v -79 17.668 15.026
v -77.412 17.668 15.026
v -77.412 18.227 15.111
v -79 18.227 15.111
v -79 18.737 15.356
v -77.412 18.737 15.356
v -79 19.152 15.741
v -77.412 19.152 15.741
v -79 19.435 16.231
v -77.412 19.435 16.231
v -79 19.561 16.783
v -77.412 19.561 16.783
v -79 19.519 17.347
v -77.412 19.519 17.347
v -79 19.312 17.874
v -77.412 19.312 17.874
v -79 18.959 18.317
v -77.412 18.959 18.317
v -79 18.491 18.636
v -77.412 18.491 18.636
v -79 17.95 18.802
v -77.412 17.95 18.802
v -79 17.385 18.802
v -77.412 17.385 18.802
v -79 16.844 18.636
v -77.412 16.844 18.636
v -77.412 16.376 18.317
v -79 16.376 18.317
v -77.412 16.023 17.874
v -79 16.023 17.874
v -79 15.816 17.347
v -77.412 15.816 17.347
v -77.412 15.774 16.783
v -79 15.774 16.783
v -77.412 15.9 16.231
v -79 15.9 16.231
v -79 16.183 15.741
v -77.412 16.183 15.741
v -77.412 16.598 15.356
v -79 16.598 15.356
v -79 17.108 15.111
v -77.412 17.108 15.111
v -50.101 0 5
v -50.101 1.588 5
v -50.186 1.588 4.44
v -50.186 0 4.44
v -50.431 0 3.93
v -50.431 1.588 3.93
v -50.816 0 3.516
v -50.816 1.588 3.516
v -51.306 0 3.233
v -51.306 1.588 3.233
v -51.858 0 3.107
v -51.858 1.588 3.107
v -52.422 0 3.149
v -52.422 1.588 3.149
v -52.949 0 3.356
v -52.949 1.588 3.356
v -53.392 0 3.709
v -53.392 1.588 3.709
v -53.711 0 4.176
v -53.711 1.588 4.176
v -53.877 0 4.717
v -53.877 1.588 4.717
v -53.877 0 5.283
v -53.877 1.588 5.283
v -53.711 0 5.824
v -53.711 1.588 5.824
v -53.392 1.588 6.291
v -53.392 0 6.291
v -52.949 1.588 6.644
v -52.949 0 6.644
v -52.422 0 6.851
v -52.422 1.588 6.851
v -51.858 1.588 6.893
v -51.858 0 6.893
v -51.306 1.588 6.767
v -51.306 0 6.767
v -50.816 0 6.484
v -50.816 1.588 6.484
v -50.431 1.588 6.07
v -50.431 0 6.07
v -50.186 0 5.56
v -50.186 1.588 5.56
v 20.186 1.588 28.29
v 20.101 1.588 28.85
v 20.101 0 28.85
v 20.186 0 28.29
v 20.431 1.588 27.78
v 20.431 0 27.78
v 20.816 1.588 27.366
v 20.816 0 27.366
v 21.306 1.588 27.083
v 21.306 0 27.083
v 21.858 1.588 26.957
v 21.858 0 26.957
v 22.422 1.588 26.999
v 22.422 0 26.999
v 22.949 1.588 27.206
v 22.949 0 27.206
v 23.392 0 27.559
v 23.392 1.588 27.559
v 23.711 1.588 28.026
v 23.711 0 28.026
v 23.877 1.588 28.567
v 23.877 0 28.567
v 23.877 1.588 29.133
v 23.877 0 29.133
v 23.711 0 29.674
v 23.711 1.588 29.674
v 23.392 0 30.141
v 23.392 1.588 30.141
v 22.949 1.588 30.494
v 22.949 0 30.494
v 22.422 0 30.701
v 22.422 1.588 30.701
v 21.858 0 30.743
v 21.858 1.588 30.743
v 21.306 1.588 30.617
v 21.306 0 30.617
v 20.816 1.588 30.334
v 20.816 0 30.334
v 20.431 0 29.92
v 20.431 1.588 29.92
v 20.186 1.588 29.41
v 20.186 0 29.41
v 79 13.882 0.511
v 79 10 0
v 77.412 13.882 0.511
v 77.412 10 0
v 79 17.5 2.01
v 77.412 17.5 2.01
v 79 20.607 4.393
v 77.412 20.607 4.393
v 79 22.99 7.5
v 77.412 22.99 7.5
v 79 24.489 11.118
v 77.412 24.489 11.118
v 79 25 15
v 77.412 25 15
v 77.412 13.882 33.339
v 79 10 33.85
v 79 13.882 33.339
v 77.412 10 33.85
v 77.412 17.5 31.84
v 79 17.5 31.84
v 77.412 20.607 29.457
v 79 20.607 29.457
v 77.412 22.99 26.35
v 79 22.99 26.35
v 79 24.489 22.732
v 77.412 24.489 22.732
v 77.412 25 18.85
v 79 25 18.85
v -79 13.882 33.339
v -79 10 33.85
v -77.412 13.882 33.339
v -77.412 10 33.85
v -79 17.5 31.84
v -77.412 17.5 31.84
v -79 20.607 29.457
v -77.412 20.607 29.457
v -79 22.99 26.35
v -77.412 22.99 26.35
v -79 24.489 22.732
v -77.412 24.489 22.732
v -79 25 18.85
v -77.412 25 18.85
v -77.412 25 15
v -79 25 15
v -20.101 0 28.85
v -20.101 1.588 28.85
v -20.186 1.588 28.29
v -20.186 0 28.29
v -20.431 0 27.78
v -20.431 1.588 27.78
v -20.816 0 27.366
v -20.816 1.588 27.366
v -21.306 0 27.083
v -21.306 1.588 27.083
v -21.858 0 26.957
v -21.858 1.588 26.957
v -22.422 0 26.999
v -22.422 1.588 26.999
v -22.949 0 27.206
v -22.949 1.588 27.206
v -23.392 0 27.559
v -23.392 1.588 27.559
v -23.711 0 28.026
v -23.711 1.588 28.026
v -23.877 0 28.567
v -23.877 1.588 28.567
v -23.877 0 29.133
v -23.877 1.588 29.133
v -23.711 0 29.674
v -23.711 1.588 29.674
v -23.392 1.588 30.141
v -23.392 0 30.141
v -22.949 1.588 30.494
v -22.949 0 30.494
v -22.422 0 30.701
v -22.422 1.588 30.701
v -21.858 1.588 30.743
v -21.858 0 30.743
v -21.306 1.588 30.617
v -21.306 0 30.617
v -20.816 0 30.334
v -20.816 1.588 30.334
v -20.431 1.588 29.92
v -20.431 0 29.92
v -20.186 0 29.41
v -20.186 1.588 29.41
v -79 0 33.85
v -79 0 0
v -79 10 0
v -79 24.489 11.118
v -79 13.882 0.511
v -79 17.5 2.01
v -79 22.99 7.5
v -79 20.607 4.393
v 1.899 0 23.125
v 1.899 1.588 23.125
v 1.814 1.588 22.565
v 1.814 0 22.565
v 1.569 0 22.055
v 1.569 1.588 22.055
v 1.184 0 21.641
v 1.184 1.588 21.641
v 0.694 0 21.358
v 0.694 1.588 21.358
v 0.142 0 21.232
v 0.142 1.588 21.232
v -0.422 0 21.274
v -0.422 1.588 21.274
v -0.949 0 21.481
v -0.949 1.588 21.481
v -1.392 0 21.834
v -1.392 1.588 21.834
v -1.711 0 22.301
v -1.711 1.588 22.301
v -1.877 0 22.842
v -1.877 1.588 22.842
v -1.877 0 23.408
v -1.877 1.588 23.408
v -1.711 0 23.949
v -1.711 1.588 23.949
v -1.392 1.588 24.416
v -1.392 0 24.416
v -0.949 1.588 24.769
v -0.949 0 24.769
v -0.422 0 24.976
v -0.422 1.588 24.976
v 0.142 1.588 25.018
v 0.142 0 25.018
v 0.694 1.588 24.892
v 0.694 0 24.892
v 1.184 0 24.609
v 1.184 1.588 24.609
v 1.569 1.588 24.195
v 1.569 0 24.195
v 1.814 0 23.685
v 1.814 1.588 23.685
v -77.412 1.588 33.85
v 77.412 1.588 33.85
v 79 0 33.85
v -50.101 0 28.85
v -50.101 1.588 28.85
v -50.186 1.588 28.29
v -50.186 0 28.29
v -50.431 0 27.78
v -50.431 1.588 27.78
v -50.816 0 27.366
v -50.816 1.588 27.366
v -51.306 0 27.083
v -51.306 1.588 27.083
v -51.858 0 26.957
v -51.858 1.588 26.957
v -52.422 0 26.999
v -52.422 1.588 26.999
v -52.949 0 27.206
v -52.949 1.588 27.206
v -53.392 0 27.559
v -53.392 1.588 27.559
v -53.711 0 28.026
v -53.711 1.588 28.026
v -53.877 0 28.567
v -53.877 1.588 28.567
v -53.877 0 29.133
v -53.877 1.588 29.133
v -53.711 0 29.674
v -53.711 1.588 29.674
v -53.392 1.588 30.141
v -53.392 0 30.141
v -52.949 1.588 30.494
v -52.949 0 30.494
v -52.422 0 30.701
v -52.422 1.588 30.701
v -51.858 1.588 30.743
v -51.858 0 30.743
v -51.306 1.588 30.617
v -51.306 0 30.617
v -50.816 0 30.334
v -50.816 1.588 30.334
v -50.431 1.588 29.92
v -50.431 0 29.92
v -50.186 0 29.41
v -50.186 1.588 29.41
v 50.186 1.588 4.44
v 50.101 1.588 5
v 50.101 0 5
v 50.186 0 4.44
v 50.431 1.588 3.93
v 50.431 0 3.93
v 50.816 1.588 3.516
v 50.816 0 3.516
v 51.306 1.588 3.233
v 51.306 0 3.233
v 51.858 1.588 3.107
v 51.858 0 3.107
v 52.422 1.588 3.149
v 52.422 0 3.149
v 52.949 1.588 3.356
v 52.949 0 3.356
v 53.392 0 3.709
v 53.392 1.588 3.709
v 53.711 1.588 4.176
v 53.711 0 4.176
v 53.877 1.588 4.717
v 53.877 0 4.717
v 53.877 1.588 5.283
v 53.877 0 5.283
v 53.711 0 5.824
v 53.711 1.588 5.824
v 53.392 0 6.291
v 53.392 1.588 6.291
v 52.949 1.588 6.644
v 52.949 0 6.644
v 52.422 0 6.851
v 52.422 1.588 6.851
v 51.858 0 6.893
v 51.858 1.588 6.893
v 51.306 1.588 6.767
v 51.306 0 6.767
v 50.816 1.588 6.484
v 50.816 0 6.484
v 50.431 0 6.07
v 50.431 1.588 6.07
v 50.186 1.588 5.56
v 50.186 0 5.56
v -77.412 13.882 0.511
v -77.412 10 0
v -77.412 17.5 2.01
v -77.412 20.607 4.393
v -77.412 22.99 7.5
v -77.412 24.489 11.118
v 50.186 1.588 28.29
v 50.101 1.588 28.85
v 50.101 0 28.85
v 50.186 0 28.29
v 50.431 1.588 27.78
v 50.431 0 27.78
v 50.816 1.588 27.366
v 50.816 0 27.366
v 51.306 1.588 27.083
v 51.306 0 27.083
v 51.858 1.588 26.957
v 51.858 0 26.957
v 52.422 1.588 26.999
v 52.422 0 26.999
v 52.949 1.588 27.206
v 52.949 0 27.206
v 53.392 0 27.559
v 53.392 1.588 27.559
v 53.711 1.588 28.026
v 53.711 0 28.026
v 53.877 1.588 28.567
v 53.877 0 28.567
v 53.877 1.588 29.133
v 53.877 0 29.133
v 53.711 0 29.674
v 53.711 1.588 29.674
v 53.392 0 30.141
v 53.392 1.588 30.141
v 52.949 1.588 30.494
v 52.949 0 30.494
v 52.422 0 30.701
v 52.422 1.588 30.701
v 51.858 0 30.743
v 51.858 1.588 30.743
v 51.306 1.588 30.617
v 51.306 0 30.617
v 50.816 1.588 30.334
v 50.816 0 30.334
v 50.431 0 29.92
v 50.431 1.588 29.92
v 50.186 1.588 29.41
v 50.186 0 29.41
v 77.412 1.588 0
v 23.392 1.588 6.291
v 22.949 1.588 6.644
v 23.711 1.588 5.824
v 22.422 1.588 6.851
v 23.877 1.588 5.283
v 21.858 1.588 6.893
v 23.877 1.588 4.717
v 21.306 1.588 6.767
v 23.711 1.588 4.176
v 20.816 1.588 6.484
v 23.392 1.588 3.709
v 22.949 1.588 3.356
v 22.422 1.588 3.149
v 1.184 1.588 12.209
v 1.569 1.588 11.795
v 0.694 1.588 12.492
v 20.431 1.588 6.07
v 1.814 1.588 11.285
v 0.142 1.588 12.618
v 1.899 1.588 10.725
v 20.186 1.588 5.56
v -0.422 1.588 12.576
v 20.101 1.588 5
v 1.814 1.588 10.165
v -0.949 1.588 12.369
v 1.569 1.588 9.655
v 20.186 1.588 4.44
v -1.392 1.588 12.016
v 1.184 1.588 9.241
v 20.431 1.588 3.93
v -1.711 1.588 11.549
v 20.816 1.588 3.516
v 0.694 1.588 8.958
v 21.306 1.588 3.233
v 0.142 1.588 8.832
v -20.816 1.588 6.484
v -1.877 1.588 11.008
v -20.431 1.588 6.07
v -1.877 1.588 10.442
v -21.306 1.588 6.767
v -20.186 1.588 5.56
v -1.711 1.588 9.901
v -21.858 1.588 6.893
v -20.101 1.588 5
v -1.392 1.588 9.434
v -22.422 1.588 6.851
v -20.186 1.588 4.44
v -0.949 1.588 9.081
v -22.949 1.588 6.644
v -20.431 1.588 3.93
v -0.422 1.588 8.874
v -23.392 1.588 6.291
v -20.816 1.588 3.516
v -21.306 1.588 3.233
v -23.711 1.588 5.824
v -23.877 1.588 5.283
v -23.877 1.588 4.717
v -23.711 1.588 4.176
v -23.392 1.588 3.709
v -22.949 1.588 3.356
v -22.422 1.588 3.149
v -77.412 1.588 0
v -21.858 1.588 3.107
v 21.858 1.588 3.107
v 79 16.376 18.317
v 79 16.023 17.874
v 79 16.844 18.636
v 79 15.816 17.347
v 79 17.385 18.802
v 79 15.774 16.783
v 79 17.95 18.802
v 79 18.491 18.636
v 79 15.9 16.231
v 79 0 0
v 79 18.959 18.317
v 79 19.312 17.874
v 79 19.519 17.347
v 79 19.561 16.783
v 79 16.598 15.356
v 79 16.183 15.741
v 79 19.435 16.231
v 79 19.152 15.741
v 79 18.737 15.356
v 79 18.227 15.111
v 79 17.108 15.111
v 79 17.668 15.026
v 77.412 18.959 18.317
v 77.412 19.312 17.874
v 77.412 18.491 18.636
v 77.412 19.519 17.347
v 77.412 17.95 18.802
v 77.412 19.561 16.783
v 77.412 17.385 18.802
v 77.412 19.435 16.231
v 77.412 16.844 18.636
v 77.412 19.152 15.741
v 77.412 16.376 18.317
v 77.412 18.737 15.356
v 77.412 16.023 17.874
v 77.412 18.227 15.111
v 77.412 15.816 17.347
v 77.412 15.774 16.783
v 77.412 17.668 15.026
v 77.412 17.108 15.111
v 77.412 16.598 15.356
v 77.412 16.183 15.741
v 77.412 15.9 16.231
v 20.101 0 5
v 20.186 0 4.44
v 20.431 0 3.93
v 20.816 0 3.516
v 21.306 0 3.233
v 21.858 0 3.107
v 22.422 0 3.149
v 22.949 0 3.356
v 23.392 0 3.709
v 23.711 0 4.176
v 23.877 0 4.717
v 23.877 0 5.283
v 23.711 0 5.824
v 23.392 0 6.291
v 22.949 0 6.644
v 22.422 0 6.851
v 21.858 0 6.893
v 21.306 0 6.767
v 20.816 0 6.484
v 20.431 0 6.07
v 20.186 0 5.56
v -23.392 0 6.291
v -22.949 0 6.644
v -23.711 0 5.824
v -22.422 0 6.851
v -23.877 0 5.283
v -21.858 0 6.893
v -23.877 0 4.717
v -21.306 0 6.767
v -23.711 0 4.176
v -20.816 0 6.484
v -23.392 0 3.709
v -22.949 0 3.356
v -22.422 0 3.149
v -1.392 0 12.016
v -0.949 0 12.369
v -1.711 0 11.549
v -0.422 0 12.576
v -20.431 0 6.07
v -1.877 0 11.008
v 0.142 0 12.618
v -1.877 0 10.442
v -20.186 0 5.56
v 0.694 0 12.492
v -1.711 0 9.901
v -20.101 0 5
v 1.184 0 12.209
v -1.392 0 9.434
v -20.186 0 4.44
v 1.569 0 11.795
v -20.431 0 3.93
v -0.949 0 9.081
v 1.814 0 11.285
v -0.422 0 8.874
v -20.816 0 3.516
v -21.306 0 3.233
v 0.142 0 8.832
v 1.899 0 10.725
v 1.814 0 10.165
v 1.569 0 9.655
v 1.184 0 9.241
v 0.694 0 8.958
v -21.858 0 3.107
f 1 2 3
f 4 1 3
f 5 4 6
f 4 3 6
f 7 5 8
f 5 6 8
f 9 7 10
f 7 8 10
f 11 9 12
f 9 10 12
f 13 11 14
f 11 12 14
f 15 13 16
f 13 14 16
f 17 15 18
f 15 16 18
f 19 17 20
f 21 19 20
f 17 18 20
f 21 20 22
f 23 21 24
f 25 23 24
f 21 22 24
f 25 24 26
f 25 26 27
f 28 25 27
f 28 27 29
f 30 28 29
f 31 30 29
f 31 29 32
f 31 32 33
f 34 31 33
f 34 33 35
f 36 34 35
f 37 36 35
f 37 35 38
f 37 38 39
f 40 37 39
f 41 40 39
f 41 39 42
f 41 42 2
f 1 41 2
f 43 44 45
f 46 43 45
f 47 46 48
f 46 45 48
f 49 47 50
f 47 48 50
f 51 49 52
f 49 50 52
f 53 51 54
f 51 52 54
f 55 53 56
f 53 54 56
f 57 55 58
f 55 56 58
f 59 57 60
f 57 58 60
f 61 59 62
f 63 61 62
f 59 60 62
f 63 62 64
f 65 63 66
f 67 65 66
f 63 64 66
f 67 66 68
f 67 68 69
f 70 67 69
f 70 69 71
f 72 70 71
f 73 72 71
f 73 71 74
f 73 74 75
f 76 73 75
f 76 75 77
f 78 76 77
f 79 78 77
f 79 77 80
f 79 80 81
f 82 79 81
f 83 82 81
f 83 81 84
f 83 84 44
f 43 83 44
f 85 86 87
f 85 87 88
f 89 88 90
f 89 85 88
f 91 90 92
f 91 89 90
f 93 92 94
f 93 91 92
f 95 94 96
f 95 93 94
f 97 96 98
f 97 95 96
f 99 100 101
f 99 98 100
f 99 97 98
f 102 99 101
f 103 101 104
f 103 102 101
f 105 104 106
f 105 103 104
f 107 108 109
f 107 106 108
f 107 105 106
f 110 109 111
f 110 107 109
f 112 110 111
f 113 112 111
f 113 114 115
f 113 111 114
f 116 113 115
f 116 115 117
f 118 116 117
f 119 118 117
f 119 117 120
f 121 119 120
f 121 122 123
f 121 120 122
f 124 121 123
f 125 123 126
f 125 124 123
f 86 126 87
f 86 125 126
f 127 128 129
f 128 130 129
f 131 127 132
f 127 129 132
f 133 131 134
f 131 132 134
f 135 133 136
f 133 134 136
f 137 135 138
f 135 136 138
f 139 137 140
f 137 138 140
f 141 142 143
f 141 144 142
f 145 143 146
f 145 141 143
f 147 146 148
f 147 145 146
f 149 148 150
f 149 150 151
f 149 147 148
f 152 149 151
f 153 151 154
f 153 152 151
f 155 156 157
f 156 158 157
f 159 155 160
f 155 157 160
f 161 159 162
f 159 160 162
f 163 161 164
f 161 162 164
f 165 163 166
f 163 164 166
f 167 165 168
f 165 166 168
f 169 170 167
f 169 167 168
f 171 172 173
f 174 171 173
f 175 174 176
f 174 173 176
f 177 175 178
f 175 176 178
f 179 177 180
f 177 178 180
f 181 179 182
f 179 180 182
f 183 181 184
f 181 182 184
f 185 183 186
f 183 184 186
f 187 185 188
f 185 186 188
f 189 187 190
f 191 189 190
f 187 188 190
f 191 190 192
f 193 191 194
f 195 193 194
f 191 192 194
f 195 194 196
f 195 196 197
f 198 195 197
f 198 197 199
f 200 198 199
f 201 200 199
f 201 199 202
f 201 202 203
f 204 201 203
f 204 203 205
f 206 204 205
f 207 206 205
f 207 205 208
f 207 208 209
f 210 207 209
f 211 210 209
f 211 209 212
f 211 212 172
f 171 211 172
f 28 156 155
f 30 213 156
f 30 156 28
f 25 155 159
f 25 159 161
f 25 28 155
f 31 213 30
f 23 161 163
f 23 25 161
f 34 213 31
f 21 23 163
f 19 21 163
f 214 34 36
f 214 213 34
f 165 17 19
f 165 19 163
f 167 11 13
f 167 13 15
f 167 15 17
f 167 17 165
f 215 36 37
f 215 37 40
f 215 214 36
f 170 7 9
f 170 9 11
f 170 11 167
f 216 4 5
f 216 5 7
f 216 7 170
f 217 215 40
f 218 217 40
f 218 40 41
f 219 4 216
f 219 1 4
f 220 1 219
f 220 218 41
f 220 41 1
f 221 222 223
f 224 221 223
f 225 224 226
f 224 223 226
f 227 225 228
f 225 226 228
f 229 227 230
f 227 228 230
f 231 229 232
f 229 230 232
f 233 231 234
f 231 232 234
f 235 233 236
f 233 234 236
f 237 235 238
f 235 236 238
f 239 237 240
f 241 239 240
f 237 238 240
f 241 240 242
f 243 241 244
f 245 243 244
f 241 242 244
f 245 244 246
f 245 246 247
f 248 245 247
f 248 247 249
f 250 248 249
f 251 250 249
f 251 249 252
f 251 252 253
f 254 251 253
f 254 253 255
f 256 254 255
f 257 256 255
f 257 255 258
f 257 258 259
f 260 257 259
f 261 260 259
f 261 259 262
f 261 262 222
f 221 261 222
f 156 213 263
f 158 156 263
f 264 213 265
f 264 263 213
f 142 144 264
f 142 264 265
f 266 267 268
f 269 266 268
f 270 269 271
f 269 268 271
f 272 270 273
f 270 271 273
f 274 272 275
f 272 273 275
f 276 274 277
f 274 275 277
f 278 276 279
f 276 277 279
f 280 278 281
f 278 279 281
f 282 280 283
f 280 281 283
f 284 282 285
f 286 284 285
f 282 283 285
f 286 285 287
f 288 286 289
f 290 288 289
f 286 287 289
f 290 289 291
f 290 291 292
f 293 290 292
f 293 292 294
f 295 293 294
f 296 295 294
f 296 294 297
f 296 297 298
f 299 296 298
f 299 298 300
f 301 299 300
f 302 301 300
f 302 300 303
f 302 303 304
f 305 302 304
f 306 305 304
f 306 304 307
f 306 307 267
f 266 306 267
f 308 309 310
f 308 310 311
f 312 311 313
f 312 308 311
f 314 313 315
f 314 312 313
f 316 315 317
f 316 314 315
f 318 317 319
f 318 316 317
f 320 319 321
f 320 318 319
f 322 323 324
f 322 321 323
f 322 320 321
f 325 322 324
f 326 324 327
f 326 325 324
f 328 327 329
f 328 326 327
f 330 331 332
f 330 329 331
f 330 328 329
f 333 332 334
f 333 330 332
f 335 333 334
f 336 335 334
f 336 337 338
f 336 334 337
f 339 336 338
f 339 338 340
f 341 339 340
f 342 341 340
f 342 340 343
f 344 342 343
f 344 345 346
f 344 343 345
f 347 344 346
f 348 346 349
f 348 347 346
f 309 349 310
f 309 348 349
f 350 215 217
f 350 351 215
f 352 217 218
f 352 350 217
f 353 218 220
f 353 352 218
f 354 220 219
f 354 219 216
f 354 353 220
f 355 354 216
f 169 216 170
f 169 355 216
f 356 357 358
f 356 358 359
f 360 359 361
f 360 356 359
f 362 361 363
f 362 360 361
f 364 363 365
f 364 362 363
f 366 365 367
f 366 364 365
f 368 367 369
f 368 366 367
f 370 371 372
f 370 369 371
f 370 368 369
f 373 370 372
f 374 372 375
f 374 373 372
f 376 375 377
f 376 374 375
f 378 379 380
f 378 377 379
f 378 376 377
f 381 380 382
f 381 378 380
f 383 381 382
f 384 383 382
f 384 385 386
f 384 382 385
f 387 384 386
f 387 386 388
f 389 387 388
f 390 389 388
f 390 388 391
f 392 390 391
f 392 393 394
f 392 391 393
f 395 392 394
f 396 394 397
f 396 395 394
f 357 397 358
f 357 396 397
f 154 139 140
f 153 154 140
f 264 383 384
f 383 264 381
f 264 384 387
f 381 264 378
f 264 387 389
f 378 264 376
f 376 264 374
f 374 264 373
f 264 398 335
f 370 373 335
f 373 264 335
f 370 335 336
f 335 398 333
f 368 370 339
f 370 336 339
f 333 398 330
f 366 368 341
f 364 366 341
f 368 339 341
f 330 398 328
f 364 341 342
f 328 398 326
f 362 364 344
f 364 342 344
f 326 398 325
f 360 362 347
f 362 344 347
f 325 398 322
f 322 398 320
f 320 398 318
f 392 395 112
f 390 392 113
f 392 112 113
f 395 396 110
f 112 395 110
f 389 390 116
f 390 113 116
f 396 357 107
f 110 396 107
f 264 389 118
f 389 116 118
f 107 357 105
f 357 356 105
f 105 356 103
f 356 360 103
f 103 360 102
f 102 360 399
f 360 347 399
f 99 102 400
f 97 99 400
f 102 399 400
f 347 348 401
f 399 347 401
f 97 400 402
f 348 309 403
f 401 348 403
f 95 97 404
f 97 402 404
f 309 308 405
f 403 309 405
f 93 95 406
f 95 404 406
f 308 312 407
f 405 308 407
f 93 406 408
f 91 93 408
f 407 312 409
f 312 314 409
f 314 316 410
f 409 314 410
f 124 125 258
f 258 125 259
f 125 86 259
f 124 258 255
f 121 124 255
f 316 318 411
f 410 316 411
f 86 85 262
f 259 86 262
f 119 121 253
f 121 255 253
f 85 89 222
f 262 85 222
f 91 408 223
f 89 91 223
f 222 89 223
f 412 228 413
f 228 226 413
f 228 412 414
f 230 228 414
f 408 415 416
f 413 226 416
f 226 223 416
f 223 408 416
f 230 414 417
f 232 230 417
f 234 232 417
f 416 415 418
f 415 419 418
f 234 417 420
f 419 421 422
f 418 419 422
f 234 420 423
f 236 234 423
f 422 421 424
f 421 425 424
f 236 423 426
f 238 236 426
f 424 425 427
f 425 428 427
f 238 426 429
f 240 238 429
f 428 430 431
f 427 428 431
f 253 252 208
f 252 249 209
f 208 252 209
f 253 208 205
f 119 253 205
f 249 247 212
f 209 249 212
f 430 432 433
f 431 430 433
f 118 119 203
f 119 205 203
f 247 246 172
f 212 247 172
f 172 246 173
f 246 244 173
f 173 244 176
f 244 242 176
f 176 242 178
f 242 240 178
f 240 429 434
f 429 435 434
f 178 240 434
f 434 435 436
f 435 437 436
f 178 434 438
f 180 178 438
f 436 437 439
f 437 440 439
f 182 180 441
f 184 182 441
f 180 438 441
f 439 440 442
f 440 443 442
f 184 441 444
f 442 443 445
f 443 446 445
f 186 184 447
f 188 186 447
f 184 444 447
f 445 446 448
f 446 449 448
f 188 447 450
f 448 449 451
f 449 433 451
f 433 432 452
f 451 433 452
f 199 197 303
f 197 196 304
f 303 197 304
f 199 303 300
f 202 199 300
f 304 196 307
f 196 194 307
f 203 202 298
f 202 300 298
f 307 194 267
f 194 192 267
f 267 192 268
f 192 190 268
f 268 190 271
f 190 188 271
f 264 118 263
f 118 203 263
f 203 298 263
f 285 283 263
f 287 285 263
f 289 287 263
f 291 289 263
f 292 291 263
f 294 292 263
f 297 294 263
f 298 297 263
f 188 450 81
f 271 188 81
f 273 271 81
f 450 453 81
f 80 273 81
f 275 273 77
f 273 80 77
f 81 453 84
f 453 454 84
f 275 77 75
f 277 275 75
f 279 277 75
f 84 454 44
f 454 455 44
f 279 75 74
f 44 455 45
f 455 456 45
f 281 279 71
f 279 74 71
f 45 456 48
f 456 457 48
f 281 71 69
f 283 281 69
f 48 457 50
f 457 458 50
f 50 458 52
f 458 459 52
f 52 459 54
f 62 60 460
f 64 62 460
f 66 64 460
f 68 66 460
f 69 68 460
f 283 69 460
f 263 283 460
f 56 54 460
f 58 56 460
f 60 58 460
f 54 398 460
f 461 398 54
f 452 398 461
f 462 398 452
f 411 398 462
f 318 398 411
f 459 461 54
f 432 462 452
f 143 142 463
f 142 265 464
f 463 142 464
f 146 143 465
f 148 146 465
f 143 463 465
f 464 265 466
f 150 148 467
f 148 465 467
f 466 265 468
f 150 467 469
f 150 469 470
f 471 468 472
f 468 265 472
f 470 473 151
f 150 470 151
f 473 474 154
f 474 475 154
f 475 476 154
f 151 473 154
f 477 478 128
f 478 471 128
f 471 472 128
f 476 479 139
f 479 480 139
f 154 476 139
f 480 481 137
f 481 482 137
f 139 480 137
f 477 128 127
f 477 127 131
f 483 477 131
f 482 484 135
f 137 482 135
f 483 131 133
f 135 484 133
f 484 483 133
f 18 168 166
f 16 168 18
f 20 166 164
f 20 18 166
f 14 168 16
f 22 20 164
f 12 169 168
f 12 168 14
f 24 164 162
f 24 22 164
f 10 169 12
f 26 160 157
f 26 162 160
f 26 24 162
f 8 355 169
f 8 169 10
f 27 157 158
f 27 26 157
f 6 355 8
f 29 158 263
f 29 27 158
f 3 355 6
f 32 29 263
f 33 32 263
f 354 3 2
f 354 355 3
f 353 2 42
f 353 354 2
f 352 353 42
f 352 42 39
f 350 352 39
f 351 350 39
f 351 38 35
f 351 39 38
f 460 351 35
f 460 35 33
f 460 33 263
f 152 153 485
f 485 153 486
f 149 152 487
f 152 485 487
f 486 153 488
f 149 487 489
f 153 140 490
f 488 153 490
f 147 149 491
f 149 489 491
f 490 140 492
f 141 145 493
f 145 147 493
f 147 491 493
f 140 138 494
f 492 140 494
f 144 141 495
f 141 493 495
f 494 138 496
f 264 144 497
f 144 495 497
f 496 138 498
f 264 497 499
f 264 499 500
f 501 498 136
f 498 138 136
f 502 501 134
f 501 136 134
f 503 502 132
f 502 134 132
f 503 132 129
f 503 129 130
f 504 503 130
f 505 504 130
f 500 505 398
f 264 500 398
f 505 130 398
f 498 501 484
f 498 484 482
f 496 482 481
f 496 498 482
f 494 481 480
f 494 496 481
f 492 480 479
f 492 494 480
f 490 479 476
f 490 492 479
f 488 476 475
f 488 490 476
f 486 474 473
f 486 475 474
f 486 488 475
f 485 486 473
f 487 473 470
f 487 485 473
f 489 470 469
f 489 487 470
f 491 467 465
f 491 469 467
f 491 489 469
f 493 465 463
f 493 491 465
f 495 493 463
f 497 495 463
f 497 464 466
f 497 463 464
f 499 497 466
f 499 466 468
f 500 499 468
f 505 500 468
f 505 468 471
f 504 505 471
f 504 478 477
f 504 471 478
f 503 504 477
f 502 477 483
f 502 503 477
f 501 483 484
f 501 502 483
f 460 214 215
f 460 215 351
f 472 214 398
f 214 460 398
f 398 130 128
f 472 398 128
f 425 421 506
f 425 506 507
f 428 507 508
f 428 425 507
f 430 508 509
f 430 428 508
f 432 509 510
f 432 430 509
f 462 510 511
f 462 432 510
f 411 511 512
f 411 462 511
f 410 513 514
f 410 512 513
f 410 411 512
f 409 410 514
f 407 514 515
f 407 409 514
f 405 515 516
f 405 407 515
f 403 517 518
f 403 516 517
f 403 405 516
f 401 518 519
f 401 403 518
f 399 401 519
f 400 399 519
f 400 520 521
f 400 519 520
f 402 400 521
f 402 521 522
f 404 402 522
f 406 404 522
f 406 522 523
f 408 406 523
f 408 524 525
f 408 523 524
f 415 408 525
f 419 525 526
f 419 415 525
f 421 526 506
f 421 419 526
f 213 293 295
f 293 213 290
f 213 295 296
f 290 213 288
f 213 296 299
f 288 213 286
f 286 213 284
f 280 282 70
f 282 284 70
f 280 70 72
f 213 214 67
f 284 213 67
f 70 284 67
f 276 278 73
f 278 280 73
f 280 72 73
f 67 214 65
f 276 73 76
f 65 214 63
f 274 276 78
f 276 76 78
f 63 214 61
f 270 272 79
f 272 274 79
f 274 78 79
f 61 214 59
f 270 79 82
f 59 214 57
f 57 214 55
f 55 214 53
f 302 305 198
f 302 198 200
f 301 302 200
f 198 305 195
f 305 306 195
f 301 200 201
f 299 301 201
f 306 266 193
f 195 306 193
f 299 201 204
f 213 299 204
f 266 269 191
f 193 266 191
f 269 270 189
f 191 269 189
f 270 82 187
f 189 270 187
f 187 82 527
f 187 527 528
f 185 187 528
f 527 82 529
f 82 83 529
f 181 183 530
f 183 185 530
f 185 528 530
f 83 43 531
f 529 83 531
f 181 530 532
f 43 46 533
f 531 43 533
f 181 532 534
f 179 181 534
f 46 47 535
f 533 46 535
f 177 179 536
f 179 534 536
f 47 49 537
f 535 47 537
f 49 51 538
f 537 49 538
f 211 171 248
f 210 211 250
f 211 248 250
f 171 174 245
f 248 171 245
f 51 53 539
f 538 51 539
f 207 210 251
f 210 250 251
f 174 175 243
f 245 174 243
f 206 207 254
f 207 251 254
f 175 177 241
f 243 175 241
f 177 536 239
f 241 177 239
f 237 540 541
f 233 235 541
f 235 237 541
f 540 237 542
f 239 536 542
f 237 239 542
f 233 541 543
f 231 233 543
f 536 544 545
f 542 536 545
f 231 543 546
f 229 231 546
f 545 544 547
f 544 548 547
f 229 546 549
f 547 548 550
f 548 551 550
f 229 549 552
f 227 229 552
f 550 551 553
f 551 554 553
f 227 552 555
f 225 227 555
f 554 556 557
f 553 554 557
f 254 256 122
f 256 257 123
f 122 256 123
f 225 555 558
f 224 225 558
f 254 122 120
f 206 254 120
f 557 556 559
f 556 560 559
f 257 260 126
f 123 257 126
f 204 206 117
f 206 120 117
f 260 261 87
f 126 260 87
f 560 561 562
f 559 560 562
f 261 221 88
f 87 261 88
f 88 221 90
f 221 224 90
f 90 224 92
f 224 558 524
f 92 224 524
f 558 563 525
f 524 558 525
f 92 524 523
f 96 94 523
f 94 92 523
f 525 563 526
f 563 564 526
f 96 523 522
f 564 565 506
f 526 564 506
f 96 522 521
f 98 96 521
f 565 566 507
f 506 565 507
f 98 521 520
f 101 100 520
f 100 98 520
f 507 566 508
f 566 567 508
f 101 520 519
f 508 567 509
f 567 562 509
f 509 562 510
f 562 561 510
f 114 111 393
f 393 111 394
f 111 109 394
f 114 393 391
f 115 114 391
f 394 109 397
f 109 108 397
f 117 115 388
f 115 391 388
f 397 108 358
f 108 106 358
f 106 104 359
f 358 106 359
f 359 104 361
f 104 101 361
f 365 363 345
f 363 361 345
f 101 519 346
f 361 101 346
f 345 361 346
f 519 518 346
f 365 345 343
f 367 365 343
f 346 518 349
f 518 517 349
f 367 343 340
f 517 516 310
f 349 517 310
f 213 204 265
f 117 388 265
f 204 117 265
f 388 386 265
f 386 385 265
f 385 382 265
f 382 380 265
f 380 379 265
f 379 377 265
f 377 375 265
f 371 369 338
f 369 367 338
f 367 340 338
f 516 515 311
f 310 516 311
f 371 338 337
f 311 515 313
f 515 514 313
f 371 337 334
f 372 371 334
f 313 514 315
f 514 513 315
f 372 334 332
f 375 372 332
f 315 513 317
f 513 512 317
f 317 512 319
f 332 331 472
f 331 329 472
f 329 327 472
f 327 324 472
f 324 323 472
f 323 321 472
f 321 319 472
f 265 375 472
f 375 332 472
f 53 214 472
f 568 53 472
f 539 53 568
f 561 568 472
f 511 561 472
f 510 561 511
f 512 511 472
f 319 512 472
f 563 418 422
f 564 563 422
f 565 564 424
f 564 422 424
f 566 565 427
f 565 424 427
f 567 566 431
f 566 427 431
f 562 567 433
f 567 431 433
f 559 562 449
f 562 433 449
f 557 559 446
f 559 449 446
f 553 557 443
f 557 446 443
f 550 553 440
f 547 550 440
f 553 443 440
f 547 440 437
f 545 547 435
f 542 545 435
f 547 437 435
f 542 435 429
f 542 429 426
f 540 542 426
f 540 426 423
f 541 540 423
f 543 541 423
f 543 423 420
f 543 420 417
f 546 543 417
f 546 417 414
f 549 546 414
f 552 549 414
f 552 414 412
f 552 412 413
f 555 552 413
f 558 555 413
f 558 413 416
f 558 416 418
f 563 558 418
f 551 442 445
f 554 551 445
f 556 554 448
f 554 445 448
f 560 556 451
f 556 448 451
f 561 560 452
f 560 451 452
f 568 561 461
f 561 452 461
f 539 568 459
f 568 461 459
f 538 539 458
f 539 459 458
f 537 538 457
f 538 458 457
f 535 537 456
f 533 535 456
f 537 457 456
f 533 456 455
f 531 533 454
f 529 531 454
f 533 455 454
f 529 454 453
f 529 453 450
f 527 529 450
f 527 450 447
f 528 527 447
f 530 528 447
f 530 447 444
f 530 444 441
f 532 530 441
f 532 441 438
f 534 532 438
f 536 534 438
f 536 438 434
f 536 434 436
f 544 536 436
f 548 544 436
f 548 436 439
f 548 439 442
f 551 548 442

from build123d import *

# Parameters (mm, degrees)
BOSS_EXTRUDE1_DEPTH   = 33.85
F_6_CLEARANCE_HOLE1_D = 3.7973
F_6_CLEARANCE_HOLE2_D = 3.7973
FILLET1_R             = 15
FILLET1_OF_MIRROR1_R  = 15
F_6_CLEARANCE_HOLE3_D = 3.7973


with BuildPart() as part:
    # Sketch1 → Boss-Extrude1 (new body)
    with BuildSketch(Plane.XY):
        Polygon((0, 0), (-79, 0), (-79, 25), (-77.4125, 25), (-77.4125, 1.5875), (0, 1.5875), align=None)
    boss_extrude1 = extrude(amount=BOSS_EXTRUDE1_DEPTH)

    # #6 Clearance Hole1 (through all)
    with Locations(Plane.ZY.offset(79)):
        with Locations((16.925, 17.6675)):
            f_6_clearance_hole1 = Hole(F_6_CLEARANCE_HOLE1_D / 2)

    # #6 Clearance Hole2 (through all)
    with Locations(Plane(origin=(0, 0, 0), x_dir=(-1, 0, 0), z_dir=(0, -1, 0))):
        with Locations((22, -5), (52, -5), (52, -28.85), (22, -28.85)):
            f_6_clearance_hole2 = Hole(F_6_CLEARANCE_HOLE2_D / 2)

    # Fillet1
    fillet1_edges = [part.edges().sort_by_distance(p)[0] for p in [
        (-78.20625, 25, 33.85),
        (-78.20625, 25, 0),
    ]]
    fillet(fillet1_edges, radius=FILLET1_R)

    # Mirror1: Boss-Extrude1, #6 Clearance Hole1, #6 Clearance Hole2 across plane
    add(boss_extrude1.mirror(Plane(origin=(0, 0, 0), x_dir=(0, 0, 1), z_dir=(1, 0, 0))))
    add(f_6_clearance_hole1.mirror(Plane(origin=(0, 0, 0), x_dir=(0, 0, 1), z_dir=(1, 0, 0))), mode=Mode.SUBTRACT)
    add(f_6_clearance_hole2.mirror(Plane(origin=(0, 0, 0), x_dir=(0, 0, 1), z_dir=(1, 0, 0))), mode=Mode.SUBTRACT)

    # Fillet1 of Mirror1
    fillet1_of_mirror1_edges = [part.edges().sort_by_distance(p)[0] for p in [
        (78.20625, 25, 33.85),
        (78.20625, 25, 0),
    ]]
    fillet(fillet1_of_mirror1_edges, radius=FILLET1_OF_MIRROR1_R)

    # #6 Clearance Hole3 (through all)
    with Locations(Plane(origin=(0, 0, 0), x_dir=(-1, 0, 0), z_dir=(0, -1, 0))):
        with Locations((0, -23.125), (0, -10.725)):
            Hole(F_6_CLEARANCE_HOLE3_D / 2)


solid = part.part
